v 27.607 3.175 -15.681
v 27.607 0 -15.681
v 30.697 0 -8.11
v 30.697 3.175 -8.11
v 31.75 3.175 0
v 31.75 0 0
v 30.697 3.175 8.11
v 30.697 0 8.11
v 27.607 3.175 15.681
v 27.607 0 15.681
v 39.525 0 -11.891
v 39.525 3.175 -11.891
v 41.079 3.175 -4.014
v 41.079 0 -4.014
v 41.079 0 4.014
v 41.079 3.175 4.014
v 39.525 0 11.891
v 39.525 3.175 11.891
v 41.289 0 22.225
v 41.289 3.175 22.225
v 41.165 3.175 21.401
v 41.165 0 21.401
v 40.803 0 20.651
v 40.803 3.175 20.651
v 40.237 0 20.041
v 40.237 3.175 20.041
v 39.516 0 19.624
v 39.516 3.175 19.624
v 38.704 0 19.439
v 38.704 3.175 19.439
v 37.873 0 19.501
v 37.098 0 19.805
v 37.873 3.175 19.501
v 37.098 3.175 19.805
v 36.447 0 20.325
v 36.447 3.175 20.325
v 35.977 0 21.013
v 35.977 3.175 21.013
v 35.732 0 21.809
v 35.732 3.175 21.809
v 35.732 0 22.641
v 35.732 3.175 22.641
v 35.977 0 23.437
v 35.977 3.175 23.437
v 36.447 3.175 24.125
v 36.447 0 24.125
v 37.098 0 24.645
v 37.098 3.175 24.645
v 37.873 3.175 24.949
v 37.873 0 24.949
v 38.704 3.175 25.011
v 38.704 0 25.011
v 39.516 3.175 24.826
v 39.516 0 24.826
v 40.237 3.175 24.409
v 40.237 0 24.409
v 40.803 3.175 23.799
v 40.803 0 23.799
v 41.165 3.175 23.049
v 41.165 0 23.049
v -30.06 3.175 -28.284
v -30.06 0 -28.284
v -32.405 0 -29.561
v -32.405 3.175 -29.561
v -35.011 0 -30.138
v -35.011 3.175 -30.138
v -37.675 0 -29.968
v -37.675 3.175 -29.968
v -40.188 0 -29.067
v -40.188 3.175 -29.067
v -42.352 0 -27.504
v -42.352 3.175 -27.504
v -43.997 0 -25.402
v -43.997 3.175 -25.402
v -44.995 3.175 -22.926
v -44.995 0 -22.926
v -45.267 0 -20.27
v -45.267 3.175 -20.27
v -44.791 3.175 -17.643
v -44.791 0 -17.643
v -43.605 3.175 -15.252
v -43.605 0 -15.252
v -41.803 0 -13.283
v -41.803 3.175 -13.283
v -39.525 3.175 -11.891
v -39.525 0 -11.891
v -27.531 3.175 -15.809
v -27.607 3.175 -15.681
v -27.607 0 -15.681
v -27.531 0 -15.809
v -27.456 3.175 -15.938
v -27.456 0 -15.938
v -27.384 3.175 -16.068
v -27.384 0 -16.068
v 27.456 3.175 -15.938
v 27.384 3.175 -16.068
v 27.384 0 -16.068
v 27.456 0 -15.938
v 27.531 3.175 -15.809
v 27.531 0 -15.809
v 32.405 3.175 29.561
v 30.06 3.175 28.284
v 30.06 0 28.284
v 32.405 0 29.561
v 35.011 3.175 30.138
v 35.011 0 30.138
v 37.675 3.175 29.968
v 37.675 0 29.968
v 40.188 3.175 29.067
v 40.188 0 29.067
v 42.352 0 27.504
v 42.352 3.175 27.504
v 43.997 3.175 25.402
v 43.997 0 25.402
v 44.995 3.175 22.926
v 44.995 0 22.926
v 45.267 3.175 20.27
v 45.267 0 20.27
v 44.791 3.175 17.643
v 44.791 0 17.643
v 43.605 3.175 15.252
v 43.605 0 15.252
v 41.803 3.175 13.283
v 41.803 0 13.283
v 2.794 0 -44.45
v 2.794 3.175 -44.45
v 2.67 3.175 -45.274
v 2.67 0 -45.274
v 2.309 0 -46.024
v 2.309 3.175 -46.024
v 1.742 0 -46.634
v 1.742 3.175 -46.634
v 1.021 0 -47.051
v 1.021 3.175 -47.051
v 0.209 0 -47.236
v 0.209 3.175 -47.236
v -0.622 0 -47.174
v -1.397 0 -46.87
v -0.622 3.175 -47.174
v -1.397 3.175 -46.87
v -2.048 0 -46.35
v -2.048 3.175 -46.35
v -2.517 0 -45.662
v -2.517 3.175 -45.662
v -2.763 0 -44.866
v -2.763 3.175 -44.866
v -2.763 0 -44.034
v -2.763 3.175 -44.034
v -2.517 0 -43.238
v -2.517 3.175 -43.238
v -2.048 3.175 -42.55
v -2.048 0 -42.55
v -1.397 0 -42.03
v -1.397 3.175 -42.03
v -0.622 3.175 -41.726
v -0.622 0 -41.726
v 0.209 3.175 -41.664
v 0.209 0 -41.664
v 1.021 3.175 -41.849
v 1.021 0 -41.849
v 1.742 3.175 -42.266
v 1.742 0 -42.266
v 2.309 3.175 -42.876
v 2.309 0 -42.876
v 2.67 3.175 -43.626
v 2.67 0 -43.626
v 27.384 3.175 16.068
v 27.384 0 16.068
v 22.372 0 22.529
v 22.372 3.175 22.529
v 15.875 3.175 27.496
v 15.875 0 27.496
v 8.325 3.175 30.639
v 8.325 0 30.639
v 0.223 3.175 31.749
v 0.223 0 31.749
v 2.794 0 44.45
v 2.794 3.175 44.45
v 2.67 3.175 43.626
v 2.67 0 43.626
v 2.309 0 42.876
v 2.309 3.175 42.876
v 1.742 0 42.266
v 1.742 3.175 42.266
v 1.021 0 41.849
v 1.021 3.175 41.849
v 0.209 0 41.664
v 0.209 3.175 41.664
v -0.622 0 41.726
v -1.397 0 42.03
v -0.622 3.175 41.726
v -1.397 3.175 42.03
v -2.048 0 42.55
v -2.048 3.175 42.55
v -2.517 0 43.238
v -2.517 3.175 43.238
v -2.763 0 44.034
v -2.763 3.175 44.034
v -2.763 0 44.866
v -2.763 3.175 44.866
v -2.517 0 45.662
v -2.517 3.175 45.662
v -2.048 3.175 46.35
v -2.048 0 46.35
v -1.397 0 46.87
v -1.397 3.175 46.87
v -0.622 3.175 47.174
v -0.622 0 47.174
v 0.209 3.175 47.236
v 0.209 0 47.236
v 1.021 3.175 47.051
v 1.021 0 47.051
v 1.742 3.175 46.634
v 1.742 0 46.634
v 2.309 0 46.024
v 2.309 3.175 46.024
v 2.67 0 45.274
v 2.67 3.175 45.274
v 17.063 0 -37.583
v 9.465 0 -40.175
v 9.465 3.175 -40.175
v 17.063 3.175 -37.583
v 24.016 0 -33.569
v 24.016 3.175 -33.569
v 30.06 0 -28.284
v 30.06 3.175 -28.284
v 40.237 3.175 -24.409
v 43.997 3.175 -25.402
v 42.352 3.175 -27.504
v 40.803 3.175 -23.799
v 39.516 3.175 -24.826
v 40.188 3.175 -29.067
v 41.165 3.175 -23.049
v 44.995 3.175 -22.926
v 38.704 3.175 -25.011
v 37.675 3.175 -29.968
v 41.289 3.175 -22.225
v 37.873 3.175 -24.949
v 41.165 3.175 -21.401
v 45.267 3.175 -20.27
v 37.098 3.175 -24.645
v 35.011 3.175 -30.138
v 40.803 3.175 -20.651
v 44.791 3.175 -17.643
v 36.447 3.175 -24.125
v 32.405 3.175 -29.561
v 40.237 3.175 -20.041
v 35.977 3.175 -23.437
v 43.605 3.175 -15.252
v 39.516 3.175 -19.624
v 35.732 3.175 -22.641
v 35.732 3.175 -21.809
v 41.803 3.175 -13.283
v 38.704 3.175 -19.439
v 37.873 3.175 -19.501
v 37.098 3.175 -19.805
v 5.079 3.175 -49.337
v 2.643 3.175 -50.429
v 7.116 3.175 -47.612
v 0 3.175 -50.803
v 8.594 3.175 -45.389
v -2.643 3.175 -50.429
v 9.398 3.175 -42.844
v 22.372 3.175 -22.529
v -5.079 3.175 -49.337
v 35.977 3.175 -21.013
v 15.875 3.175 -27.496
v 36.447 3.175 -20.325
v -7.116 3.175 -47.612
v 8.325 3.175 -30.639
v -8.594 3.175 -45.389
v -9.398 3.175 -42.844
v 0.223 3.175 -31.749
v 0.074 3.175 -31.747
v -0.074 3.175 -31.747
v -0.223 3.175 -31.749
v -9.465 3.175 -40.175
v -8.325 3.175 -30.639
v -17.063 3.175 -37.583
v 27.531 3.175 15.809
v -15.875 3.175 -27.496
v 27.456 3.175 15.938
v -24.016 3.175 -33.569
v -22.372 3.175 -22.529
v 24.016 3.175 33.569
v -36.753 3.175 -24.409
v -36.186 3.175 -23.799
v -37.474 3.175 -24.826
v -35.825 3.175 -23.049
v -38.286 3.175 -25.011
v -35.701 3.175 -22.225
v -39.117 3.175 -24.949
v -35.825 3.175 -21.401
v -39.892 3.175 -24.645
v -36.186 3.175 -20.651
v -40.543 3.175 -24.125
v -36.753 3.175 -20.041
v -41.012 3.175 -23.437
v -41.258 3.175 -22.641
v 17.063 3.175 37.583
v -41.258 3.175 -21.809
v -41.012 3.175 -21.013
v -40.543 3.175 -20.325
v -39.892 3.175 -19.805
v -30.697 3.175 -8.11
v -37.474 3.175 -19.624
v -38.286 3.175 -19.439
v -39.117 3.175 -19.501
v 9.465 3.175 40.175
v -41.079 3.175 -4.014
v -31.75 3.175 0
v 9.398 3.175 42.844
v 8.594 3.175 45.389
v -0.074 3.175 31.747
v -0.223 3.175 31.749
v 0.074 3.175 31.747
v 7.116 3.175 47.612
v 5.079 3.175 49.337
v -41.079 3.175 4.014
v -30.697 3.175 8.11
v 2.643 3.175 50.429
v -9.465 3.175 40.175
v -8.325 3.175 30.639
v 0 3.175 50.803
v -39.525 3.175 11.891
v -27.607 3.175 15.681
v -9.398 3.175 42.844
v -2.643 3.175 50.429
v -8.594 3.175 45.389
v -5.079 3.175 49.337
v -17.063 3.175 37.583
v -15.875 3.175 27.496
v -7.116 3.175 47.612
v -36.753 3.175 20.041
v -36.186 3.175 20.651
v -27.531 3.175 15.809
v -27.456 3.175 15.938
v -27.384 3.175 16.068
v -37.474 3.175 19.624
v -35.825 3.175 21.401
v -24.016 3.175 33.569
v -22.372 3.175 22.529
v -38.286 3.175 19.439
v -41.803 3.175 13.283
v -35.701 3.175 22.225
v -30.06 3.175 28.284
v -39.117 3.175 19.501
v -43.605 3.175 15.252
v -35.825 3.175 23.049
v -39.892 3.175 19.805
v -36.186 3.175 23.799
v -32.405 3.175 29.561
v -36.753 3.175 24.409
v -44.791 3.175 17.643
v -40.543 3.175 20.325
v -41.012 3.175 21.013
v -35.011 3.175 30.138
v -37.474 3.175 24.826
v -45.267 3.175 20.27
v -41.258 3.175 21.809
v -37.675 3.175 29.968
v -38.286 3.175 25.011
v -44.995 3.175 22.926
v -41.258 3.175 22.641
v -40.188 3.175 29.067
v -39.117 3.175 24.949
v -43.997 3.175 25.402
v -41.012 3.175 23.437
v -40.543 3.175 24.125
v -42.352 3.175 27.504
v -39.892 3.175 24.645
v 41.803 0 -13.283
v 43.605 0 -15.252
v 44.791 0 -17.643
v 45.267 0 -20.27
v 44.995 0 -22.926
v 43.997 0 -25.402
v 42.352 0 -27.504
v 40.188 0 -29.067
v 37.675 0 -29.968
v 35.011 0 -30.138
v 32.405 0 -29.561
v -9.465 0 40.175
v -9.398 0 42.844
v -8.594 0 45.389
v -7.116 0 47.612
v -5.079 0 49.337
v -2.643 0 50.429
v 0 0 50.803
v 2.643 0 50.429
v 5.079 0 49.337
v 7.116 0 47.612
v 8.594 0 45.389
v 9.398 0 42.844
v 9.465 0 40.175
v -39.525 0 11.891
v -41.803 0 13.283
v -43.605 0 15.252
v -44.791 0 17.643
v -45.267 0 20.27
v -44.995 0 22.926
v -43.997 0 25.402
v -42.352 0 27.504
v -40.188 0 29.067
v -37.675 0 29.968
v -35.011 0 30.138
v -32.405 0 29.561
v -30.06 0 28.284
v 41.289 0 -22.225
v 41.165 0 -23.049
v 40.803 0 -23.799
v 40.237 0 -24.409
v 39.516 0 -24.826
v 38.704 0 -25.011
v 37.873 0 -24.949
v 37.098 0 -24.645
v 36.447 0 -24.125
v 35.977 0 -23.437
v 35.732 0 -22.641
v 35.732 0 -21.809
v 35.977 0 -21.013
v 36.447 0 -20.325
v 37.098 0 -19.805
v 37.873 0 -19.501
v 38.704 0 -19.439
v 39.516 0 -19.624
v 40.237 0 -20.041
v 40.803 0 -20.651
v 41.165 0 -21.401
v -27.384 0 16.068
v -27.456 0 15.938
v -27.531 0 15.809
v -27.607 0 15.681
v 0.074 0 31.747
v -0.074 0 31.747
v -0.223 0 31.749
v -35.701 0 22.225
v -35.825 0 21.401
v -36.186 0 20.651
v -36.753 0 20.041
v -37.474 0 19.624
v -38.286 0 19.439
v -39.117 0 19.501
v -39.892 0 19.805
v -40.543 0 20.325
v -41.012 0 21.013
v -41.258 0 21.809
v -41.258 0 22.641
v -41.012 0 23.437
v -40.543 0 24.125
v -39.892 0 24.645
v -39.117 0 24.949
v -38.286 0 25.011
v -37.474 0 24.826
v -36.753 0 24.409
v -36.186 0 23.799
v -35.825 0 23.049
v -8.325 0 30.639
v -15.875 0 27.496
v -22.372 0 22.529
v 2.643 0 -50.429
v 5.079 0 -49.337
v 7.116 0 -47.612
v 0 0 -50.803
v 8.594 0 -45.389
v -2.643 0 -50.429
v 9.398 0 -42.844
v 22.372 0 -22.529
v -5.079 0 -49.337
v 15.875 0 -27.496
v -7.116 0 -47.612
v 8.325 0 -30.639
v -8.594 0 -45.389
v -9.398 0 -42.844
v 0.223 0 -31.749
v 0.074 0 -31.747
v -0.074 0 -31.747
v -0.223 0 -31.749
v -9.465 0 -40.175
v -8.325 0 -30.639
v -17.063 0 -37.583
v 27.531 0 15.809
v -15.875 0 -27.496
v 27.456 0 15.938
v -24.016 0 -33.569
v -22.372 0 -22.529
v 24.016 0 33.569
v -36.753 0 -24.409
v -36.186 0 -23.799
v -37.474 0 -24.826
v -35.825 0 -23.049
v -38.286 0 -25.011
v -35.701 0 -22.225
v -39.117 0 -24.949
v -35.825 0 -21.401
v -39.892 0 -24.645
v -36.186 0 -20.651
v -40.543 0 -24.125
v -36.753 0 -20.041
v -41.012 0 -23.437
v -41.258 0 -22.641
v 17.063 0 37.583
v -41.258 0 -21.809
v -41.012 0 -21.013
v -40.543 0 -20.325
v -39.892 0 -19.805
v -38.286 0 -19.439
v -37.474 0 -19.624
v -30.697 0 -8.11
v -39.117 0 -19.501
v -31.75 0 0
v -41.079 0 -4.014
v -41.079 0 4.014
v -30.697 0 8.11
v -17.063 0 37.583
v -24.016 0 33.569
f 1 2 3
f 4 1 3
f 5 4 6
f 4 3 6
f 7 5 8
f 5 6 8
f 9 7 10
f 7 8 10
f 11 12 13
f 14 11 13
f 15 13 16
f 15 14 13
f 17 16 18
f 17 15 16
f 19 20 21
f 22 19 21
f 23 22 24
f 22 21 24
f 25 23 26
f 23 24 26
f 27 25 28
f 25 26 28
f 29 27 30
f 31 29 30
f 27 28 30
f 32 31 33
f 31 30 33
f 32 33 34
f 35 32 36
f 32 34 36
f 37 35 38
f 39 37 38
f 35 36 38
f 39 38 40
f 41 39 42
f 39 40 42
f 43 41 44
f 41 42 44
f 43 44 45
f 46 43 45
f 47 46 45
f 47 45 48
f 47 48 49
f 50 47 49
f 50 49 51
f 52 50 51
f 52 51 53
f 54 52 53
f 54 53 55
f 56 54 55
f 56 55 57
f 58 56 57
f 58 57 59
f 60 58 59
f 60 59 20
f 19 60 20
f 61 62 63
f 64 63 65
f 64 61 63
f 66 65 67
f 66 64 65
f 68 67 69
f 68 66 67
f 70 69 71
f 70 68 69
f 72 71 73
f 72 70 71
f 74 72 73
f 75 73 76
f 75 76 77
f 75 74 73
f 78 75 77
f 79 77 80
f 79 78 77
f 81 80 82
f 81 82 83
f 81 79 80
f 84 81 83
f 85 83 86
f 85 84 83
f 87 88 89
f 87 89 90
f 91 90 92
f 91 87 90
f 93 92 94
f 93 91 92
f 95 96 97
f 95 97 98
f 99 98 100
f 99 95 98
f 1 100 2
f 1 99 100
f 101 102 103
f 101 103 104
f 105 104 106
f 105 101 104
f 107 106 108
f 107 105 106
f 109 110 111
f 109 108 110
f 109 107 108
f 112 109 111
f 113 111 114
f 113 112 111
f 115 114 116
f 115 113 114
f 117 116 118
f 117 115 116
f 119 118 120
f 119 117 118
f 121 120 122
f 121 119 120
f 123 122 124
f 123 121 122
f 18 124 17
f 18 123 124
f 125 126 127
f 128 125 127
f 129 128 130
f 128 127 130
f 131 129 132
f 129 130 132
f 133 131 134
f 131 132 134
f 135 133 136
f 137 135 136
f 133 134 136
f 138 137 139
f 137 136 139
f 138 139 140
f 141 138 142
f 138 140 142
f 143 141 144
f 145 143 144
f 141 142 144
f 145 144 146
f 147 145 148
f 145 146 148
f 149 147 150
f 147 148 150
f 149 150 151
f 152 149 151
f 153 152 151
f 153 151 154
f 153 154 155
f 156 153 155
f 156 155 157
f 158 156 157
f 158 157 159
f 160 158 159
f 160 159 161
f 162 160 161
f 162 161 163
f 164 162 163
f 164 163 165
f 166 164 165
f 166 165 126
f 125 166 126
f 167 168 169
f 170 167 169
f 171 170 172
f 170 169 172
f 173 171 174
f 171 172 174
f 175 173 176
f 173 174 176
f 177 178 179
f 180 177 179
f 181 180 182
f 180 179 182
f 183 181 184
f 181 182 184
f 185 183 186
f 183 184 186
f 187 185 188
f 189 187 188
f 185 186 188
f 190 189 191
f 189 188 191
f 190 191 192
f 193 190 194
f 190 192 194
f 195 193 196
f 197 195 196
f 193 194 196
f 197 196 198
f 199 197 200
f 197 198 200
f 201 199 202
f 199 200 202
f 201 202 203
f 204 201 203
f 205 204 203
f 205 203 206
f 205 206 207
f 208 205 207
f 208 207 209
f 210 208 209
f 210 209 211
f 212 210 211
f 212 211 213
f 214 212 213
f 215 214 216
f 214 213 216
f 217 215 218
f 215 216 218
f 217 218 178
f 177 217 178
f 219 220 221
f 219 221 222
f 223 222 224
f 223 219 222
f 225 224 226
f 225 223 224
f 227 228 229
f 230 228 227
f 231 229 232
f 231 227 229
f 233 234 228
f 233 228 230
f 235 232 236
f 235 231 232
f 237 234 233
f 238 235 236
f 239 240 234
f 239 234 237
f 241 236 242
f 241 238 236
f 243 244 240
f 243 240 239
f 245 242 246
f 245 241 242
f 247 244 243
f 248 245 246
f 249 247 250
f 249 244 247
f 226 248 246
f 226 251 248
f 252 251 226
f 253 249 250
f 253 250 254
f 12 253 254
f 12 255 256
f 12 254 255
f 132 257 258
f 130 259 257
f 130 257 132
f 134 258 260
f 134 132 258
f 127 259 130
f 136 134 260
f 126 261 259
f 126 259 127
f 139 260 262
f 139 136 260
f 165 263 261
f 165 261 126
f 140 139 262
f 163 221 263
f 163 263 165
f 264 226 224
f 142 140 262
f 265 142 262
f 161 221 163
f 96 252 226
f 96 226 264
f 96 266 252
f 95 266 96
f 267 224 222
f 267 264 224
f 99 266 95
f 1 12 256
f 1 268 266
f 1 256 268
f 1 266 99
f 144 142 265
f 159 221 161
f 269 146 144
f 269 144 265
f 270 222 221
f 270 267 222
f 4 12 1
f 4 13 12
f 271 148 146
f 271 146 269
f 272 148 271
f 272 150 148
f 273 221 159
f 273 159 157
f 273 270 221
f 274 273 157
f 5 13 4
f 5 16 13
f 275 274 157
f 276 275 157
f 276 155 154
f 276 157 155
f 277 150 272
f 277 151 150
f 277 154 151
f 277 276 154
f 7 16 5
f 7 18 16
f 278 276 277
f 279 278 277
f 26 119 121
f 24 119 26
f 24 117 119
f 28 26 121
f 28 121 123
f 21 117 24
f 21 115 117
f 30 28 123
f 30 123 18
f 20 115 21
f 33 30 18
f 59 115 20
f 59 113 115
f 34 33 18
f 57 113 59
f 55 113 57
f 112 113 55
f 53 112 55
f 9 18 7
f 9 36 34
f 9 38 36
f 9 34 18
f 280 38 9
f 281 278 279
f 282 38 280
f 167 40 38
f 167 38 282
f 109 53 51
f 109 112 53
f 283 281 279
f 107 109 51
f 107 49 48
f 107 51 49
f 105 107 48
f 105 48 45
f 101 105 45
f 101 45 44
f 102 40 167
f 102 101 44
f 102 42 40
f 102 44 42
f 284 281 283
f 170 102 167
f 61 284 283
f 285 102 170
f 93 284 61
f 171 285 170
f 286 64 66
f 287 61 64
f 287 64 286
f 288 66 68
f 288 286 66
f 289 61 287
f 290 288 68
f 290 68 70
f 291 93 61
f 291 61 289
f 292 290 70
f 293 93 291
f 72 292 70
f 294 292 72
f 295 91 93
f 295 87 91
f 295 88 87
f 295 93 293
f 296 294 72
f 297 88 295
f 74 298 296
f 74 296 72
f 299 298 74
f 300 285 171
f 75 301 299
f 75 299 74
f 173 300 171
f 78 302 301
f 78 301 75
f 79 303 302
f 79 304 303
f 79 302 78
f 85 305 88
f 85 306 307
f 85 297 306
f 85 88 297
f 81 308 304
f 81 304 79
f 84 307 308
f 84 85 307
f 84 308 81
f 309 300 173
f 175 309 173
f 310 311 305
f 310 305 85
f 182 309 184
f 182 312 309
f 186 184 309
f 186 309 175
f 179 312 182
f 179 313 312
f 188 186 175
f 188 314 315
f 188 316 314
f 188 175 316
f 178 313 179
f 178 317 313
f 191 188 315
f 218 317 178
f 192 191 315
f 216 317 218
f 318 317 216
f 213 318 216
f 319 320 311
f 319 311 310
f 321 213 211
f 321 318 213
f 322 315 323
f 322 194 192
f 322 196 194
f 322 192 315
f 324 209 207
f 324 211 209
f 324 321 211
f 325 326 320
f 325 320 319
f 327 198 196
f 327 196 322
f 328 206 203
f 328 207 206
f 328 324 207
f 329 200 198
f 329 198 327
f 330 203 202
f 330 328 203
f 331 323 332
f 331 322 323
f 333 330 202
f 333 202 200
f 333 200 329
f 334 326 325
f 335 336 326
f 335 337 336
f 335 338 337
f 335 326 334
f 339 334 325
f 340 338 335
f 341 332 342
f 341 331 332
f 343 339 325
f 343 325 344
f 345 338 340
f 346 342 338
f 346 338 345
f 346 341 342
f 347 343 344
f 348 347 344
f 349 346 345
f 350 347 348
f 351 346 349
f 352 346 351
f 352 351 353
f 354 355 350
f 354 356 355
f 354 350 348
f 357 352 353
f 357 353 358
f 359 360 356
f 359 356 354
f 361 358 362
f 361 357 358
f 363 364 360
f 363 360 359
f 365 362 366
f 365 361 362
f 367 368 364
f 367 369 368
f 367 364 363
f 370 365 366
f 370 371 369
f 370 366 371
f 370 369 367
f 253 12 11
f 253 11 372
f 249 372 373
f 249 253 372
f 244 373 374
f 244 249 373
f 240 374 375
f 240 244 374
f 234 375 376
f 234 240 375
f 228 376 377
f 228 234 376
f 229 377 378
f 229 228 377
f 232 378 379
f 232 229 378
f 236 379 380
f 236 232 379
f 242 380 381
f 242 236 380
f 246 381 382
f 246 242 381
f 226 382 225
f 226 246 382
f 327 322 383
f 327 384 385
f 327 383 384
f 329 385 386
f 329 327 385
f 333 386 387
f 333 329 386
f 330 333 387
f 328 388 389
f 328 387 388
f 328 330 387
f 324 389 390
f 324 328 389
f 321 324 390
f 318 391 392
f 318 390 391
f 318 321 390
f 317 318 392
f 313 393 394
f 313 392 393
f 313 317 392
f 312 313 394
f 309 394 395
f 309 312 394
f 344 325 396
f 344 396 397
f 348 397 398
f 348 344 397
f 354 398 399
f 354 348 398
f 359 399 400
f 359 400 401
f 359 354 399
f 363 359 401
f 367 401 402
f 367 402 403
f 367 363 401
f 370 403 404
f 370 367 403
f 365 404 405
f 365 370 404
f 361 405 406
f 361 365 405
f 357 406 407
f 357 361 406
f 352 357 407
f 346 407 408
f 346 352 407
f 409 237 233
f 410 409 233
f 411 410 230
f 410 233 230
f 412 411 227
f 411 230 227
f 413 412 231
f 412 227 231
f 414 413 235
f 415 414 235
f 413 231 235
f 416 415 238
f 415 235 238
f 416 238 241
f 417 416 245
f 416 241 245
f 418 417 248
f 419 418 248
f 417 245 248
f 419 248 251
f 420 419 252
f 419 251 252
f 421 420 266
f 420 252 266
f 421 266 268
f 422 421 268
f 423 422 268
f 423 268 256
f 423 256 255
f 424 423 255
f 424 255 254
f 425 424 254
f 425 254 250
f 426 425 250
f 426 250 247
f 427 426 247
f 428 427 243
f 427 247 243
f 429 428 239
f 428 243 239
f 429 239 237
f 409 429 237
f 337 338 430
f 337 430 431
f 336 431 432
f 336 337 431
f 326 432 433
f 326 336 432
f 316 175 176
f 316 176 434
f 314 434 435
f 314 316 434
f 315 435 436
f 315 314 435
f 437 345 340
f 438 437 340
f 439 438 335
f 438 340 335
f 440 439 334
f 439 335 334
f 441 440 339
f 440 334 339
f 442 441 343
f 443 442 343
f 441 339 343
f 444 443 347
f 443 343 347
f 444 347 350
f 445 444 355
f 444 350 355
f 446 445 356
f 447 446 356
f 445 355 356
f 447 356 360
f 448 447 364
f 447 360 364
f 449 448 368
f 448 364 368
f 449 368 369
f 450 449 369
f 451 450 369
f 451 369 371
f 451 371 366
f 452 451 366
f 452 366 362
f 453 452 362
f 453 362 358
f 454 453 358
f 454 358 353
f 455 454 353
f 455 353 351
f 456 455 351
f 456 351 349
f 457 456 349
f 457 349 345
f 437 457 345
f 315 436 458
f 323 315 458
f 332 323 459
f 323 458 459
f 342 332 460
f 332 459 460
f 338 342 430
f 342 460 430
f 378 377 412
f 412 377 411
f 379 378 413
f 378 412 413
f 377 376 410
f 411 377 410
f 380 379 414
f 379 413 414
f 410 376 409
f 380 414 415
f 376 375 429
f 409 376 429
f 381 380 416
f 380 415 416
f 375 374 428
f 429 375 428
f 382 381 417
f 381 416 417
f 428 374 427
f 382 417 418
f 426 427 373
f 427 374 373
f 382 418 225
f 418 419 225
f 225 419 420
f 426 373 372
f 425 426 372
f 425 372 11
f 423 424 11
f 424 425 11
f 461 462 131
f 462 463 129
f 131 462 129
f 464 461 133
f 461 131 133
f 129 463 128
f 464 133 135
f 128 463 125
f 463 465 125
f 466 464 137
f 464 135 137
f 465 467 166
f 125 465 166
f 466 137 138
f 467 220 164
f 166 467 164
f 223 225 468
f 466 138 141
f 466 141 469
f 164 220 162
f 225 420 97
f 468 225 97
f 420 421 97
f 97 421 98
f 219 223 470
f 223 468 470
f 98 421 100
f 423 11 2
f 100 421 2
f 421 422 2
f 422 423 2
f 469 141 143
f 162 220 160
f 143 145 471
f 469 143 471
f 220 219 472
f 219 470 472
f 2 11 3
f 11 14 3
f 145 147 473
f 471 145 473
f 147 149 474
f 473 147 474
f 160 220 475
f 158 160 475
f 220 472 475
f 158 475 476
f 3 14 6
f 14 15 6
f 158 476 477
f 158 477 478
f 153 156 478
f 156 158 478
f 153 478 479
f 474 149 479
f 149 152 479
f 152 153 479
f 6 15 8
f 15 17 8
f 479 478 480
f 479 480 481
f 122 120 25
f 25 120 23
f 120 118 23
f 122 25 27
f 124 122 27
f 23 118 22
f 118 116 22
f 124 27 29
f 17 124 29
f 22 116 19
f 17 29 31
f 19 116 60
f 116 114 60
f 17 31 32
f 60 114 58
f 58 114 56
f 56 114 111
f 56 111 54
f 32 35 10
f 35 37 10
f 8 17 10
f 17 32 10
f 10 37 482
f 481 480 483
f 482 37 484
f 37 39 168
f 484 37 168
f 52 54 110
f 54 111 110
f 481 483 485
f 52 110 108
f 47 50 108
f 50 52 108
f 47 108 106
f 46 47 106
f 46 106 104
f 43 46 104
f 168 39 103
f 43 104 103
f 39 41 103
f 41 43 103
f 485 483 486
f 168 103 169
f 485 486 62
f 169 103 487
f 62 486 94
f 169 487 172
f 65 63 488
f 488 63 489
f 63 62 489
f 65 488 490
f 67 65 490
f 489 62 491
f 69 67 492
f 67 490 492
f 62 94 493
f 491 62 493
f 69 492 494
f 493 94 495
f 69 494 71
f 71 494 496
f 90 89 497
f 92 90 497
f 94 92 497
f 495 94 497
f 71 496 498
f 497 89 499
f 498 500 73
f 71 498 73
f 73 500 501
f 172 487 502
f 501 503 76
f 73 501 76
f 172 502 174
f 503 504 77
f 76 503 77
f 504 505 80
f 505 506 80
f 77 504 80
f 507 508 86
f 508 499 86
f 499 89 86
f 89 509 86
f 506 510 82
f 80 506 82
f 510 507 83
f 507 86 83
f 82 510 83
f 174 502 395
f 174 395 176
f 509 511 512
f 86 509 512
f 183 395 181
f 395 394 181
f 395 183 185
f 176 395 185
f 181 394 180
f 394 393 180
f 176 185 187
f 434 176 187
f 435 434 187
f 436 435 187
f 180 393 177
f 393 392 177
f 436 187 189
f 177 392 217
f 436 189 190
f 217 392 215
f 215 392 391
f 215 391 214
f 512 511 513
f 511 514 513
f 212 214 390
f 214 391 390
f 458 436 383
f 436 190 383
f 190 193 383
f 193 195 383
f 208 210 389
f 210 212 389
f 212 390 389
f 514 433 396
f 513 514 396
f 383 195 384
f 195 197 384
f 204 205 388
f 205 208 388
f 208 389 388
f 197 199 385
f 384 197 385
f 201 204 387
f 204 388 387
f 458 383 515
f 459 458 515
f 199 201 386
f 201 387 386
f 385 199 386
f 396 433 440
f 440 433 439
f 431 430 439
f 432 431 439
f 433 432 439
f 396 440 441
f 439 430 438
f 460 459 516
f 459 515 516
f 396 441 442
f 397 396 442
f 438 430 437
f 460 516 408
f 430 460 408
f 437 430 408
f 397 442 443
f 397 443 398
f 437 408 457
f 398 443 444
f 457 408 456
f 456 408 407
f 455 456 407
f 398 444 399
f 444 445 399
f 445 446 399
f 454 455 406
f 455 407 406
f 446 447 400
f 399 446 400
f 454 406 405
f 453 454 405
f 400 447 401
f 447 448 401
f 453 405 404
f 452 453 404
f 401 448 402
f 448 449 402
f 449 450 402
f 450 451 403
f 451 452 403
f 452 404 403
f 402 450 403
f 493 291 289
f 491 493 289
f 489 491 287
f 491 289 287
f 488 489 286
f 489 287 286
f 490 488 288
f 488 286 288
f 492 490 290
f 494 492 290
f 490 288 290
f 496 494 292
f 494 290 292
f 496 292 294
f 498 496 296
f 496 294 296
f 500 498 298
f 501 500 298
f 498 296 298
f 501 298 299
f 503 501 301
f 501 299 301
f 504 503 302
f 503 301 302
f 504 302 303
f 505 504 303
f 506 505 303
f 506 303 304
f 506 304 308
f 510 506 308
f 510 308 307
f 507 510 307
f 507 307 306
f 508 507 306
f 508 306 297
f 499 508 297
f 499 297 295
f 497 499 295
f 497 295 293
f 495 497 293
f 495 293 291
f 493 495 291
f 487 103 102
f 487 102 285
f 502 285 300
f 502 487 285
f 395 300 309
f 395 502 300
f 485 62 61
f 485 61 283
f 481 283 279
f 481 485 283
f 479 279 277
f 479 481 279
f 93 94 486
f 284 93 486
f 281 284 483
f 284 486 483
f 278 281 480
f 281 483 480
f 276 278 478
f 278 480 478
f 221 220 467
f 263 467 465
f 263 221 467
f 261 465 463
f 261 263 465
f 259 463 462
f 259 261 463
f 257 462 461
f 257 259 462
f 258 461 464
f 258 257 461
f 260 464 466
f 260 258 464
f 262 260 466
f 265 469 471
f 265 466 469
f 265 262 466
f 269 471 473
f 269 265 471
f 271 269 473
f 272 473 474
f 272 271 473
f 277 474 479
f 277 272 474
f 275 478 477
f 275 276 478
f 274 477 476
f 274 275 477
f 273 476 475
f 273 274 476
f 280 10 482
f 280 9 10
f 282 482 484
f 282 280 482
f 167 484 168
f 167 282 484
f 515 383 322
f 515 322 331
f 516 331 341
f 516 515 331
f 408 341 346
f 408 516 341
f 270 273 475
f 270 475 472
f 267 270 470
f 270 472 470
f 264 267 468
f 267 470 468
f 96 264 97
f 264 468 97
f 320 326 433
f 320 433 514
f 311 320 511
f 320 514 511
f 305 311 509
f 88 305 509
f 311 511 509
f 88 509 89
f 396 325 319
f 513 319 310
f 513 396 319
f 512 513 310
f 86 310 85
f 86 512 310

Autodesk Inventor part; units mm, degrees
ref_plane "YZ Plane" through (0, 0, 0) normal (1, 0, 0) x (0, 1, 0)
ref_plane "XZ Plane" through (0, 0, 0) normal (0, 1, 0) x (-1, 0, 0)
ref_plane "XY Plane" through (0, 0, 0) normal (0, 0, 1) x (1, 0, 0)
sketch "Sketch11" plane through (0, 0, 0) normal (0, 1, 0) x (-1, 0, 0)
  circle A0 centre (0, 0) radius 31.75
  circle A1 centre (0, 0) radius 41.275
  dimension "d79" = 63.5
  dimension "d80" = 82.55
extrude "Extrusion10" add sketch "Sketch11" along normal blind 3.175
sketch "Sketch12" plane through (0, 3.175, 0) normal (0, 1, 0) x (1, 0, 0)
  circle A0 centre (0, 0) radius 41.275 projected
  circle A1 centre (0, -41.275) radius 9.5284
  circle A2 centre (35.7452, -20.6375) radius 9.5284
  circle A3 centre (35.7452, 20.6375) radius 9.5284
  circle A4 centre (0, 41.275) radius 9.5284
  circle A5 centre (-35.7452, 20.6375) radius 9.5284
  circle A6 centre (-35.7452, -20.6375) radius 9.5284
  dimension "d85" = 360
extrude "Extrusion11" add sketch "Sketch12" against normal blind 3.175 contours A3 A0 | A0 A3 | A2 A0 | A0 A2 | A4 A0 | A0 A4 | A1 A0 | A0 A1 | A5 A0 | A0 A5 | A6 A0 | A0 A6
sketch "Sketch13" plane through (0, 3.175, 0) normal (0, 1, 0) x (1, 0, 0)
  circle A0 centre (0, -44.45) radius 2.794
  circle A1 centre (38.4948, -22.225) radius 2.794
  circle A2 centre (38.4948, 22.225) radius 2.794
  circle A3 centre (0, 44.45) radius 2.794
  circle A4 centre (-38.4948, 22.225) radius 2.794
  circle A5 centre (-38.4948, -22.225) radius 2.794
  point P0 (0, 0)
  dimension "d89" = 5.588
  dimension "d92" = 360
extrude "Extrusion12" cut sketch "Sketch13" against normal blind 3.175
properties part number "rubber ring"
